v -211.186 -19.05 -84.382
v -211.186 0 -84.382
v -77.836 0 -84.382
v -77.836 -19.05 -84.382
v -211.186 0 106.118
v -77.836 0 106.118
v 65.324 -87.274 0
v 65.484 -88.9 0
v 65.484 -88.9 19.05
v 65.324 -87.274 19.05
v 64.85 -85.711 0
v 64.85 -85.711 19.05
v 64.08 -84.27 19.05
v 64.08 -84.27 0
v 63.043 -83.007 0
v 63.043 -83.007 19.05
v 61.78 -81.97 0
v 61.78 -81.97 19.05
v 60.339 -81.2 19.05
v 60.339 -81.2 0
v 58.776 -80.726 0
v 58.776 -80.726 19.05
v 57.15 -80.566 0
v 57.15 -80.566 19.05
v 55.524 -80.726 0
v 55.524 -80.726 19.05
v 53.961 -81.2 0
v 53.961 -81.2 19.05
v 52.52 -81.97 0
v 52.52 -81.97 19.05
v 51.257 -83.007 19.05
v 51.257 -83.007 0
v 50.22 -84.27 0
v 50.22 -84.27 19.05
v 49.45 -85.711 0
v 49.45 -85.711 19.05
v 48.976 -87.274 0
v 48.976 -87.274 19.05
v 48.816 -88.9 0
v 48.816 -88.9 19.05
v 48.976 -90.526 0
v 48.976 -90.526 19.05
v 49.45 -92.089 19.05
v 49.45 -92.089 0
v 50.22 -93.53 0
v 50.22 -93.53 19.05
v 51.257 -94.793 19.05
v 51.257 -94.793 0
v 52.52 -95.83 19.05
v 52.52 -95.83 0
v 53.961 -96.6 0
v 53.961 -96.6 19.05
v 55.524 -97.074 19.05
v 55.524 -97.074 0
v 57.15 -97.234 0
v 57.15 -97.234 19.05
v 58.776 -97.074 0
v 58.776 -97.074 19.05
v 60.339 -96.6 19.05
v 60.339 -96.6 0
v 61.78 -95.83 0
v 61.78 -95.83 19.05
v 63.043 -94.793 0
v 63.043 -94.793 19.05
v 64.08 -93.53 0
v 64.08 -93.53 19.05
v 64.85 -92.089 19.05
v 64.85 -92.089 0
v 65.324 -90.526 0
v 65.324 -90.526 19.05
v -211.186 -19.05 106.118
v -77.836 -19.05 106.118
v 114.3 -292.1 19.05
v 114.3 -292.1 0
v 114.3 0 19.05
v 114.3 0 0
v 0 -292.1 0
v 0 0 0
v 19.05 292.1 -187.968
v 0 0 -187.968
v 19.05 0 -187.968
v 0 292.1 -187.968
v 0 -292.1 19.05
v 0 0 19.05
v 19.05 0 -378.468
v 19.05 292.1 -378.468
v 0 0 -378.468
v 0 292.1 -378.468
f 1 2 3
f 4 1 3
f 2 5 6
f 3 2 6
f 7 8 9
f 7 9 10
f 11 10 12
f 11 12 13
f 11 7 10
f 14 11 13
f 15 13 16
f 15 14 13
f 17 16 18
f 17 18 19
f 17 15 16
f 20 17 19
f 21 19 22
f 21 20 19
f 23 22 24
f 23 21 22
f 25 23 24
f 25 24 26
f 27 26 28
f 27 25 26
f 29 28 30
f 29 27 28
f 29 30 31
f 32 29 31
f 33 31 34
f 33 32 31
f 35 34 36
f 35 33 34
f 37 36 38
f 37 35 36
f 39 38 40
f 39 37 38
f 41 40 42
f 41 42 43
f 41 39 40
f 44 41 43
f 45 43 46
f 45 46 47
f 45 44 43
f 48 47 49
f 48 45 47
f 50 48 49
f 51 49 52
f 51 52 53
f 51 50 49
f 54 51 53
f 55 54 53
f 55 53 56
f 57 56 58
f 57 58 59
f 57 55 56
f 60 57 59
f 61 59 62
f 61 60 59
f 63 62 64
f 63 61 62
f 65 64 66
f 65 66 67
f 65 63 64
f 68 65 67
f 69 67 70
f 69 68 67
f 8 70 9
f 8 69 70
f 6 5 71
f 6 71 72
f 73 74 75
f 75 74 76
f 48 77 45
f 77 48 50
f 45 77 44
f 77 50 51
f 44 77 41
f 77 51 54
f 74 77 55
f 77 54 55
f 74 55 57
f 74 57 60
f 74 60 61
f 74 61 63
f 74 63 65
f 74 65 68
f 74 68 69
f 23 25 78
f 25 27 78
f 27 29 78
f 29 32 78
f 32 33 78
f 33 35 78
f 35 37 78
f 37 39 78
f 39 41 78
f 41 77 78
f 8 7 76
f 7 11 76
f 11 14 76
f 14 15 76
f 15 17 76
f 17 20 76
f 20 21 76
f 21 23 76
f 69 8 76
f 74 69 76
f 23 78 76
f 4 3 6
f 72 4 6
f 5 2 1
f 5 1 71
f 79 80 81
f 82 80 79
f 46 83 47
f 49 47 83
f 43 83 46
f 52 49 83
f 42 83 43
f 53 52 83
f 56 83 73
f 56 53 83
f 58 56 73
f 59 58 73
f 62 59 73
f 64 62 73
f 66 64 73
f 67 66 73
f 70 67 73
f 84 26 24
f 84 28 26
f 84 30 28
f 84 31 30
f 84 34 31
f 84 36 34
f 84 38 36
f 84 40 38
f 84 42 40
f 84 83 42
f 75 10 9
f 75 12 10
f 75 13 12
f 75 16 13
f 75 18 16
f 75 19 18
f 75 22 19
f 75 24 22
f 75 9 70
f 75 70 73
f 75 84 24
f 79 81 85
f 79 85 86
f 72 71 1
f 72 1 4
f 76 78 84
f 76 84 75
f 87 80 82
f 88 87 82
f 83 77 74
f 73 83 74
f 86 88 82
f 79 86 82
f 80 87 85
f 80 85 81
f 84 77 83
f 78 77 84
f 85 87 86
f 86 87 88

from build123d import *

# Parameters (mm, degrees)
F0_W     = 114.3
F0_H     = 292.1
F0_R     = 8.334375
F1_DEPTH = 19.05
F2_W     = 292.1
F2_H     = 190.5
F3_DEPTH = 19.05
F4_W     = 133.35
F4_H     = 190.5
F5_DEPTH = 19.05


with BuildPart() as f1:
    # F0 (on Top) → F1 (new body)
    with BuildSketch(Plane.XY):
        with Locations((57.15, -146.05)):
            Rectangle(F0_W, F0_H)
        with Locations((57.15, -88.9)):
            Circle(F0_R, mode=Mode.SUBTRACT)
    extrude(amount=F1_DEPTH)


with BuildPart() as f3:
    # F2 (on Right) → F3 (new body)
    with BuildSketch(Plane.YZ):
        with Locations((146.05, -283.218129)):
            Rectangle(F2_W, F2_H)
    extrude(amount=F3_DEPTH)


with BuildPart() as f5:
    # F4 (on Front) → F5 (new body)
    with BuildSketch(Plane.XZ):
        with Locations((-144.511365, 10.868286)):
            Rectangle(F4_W, F4_H)
    extrude(amount=F5_DEPTH)


solid = Compound([f1.part, f3.part, f5.part])
